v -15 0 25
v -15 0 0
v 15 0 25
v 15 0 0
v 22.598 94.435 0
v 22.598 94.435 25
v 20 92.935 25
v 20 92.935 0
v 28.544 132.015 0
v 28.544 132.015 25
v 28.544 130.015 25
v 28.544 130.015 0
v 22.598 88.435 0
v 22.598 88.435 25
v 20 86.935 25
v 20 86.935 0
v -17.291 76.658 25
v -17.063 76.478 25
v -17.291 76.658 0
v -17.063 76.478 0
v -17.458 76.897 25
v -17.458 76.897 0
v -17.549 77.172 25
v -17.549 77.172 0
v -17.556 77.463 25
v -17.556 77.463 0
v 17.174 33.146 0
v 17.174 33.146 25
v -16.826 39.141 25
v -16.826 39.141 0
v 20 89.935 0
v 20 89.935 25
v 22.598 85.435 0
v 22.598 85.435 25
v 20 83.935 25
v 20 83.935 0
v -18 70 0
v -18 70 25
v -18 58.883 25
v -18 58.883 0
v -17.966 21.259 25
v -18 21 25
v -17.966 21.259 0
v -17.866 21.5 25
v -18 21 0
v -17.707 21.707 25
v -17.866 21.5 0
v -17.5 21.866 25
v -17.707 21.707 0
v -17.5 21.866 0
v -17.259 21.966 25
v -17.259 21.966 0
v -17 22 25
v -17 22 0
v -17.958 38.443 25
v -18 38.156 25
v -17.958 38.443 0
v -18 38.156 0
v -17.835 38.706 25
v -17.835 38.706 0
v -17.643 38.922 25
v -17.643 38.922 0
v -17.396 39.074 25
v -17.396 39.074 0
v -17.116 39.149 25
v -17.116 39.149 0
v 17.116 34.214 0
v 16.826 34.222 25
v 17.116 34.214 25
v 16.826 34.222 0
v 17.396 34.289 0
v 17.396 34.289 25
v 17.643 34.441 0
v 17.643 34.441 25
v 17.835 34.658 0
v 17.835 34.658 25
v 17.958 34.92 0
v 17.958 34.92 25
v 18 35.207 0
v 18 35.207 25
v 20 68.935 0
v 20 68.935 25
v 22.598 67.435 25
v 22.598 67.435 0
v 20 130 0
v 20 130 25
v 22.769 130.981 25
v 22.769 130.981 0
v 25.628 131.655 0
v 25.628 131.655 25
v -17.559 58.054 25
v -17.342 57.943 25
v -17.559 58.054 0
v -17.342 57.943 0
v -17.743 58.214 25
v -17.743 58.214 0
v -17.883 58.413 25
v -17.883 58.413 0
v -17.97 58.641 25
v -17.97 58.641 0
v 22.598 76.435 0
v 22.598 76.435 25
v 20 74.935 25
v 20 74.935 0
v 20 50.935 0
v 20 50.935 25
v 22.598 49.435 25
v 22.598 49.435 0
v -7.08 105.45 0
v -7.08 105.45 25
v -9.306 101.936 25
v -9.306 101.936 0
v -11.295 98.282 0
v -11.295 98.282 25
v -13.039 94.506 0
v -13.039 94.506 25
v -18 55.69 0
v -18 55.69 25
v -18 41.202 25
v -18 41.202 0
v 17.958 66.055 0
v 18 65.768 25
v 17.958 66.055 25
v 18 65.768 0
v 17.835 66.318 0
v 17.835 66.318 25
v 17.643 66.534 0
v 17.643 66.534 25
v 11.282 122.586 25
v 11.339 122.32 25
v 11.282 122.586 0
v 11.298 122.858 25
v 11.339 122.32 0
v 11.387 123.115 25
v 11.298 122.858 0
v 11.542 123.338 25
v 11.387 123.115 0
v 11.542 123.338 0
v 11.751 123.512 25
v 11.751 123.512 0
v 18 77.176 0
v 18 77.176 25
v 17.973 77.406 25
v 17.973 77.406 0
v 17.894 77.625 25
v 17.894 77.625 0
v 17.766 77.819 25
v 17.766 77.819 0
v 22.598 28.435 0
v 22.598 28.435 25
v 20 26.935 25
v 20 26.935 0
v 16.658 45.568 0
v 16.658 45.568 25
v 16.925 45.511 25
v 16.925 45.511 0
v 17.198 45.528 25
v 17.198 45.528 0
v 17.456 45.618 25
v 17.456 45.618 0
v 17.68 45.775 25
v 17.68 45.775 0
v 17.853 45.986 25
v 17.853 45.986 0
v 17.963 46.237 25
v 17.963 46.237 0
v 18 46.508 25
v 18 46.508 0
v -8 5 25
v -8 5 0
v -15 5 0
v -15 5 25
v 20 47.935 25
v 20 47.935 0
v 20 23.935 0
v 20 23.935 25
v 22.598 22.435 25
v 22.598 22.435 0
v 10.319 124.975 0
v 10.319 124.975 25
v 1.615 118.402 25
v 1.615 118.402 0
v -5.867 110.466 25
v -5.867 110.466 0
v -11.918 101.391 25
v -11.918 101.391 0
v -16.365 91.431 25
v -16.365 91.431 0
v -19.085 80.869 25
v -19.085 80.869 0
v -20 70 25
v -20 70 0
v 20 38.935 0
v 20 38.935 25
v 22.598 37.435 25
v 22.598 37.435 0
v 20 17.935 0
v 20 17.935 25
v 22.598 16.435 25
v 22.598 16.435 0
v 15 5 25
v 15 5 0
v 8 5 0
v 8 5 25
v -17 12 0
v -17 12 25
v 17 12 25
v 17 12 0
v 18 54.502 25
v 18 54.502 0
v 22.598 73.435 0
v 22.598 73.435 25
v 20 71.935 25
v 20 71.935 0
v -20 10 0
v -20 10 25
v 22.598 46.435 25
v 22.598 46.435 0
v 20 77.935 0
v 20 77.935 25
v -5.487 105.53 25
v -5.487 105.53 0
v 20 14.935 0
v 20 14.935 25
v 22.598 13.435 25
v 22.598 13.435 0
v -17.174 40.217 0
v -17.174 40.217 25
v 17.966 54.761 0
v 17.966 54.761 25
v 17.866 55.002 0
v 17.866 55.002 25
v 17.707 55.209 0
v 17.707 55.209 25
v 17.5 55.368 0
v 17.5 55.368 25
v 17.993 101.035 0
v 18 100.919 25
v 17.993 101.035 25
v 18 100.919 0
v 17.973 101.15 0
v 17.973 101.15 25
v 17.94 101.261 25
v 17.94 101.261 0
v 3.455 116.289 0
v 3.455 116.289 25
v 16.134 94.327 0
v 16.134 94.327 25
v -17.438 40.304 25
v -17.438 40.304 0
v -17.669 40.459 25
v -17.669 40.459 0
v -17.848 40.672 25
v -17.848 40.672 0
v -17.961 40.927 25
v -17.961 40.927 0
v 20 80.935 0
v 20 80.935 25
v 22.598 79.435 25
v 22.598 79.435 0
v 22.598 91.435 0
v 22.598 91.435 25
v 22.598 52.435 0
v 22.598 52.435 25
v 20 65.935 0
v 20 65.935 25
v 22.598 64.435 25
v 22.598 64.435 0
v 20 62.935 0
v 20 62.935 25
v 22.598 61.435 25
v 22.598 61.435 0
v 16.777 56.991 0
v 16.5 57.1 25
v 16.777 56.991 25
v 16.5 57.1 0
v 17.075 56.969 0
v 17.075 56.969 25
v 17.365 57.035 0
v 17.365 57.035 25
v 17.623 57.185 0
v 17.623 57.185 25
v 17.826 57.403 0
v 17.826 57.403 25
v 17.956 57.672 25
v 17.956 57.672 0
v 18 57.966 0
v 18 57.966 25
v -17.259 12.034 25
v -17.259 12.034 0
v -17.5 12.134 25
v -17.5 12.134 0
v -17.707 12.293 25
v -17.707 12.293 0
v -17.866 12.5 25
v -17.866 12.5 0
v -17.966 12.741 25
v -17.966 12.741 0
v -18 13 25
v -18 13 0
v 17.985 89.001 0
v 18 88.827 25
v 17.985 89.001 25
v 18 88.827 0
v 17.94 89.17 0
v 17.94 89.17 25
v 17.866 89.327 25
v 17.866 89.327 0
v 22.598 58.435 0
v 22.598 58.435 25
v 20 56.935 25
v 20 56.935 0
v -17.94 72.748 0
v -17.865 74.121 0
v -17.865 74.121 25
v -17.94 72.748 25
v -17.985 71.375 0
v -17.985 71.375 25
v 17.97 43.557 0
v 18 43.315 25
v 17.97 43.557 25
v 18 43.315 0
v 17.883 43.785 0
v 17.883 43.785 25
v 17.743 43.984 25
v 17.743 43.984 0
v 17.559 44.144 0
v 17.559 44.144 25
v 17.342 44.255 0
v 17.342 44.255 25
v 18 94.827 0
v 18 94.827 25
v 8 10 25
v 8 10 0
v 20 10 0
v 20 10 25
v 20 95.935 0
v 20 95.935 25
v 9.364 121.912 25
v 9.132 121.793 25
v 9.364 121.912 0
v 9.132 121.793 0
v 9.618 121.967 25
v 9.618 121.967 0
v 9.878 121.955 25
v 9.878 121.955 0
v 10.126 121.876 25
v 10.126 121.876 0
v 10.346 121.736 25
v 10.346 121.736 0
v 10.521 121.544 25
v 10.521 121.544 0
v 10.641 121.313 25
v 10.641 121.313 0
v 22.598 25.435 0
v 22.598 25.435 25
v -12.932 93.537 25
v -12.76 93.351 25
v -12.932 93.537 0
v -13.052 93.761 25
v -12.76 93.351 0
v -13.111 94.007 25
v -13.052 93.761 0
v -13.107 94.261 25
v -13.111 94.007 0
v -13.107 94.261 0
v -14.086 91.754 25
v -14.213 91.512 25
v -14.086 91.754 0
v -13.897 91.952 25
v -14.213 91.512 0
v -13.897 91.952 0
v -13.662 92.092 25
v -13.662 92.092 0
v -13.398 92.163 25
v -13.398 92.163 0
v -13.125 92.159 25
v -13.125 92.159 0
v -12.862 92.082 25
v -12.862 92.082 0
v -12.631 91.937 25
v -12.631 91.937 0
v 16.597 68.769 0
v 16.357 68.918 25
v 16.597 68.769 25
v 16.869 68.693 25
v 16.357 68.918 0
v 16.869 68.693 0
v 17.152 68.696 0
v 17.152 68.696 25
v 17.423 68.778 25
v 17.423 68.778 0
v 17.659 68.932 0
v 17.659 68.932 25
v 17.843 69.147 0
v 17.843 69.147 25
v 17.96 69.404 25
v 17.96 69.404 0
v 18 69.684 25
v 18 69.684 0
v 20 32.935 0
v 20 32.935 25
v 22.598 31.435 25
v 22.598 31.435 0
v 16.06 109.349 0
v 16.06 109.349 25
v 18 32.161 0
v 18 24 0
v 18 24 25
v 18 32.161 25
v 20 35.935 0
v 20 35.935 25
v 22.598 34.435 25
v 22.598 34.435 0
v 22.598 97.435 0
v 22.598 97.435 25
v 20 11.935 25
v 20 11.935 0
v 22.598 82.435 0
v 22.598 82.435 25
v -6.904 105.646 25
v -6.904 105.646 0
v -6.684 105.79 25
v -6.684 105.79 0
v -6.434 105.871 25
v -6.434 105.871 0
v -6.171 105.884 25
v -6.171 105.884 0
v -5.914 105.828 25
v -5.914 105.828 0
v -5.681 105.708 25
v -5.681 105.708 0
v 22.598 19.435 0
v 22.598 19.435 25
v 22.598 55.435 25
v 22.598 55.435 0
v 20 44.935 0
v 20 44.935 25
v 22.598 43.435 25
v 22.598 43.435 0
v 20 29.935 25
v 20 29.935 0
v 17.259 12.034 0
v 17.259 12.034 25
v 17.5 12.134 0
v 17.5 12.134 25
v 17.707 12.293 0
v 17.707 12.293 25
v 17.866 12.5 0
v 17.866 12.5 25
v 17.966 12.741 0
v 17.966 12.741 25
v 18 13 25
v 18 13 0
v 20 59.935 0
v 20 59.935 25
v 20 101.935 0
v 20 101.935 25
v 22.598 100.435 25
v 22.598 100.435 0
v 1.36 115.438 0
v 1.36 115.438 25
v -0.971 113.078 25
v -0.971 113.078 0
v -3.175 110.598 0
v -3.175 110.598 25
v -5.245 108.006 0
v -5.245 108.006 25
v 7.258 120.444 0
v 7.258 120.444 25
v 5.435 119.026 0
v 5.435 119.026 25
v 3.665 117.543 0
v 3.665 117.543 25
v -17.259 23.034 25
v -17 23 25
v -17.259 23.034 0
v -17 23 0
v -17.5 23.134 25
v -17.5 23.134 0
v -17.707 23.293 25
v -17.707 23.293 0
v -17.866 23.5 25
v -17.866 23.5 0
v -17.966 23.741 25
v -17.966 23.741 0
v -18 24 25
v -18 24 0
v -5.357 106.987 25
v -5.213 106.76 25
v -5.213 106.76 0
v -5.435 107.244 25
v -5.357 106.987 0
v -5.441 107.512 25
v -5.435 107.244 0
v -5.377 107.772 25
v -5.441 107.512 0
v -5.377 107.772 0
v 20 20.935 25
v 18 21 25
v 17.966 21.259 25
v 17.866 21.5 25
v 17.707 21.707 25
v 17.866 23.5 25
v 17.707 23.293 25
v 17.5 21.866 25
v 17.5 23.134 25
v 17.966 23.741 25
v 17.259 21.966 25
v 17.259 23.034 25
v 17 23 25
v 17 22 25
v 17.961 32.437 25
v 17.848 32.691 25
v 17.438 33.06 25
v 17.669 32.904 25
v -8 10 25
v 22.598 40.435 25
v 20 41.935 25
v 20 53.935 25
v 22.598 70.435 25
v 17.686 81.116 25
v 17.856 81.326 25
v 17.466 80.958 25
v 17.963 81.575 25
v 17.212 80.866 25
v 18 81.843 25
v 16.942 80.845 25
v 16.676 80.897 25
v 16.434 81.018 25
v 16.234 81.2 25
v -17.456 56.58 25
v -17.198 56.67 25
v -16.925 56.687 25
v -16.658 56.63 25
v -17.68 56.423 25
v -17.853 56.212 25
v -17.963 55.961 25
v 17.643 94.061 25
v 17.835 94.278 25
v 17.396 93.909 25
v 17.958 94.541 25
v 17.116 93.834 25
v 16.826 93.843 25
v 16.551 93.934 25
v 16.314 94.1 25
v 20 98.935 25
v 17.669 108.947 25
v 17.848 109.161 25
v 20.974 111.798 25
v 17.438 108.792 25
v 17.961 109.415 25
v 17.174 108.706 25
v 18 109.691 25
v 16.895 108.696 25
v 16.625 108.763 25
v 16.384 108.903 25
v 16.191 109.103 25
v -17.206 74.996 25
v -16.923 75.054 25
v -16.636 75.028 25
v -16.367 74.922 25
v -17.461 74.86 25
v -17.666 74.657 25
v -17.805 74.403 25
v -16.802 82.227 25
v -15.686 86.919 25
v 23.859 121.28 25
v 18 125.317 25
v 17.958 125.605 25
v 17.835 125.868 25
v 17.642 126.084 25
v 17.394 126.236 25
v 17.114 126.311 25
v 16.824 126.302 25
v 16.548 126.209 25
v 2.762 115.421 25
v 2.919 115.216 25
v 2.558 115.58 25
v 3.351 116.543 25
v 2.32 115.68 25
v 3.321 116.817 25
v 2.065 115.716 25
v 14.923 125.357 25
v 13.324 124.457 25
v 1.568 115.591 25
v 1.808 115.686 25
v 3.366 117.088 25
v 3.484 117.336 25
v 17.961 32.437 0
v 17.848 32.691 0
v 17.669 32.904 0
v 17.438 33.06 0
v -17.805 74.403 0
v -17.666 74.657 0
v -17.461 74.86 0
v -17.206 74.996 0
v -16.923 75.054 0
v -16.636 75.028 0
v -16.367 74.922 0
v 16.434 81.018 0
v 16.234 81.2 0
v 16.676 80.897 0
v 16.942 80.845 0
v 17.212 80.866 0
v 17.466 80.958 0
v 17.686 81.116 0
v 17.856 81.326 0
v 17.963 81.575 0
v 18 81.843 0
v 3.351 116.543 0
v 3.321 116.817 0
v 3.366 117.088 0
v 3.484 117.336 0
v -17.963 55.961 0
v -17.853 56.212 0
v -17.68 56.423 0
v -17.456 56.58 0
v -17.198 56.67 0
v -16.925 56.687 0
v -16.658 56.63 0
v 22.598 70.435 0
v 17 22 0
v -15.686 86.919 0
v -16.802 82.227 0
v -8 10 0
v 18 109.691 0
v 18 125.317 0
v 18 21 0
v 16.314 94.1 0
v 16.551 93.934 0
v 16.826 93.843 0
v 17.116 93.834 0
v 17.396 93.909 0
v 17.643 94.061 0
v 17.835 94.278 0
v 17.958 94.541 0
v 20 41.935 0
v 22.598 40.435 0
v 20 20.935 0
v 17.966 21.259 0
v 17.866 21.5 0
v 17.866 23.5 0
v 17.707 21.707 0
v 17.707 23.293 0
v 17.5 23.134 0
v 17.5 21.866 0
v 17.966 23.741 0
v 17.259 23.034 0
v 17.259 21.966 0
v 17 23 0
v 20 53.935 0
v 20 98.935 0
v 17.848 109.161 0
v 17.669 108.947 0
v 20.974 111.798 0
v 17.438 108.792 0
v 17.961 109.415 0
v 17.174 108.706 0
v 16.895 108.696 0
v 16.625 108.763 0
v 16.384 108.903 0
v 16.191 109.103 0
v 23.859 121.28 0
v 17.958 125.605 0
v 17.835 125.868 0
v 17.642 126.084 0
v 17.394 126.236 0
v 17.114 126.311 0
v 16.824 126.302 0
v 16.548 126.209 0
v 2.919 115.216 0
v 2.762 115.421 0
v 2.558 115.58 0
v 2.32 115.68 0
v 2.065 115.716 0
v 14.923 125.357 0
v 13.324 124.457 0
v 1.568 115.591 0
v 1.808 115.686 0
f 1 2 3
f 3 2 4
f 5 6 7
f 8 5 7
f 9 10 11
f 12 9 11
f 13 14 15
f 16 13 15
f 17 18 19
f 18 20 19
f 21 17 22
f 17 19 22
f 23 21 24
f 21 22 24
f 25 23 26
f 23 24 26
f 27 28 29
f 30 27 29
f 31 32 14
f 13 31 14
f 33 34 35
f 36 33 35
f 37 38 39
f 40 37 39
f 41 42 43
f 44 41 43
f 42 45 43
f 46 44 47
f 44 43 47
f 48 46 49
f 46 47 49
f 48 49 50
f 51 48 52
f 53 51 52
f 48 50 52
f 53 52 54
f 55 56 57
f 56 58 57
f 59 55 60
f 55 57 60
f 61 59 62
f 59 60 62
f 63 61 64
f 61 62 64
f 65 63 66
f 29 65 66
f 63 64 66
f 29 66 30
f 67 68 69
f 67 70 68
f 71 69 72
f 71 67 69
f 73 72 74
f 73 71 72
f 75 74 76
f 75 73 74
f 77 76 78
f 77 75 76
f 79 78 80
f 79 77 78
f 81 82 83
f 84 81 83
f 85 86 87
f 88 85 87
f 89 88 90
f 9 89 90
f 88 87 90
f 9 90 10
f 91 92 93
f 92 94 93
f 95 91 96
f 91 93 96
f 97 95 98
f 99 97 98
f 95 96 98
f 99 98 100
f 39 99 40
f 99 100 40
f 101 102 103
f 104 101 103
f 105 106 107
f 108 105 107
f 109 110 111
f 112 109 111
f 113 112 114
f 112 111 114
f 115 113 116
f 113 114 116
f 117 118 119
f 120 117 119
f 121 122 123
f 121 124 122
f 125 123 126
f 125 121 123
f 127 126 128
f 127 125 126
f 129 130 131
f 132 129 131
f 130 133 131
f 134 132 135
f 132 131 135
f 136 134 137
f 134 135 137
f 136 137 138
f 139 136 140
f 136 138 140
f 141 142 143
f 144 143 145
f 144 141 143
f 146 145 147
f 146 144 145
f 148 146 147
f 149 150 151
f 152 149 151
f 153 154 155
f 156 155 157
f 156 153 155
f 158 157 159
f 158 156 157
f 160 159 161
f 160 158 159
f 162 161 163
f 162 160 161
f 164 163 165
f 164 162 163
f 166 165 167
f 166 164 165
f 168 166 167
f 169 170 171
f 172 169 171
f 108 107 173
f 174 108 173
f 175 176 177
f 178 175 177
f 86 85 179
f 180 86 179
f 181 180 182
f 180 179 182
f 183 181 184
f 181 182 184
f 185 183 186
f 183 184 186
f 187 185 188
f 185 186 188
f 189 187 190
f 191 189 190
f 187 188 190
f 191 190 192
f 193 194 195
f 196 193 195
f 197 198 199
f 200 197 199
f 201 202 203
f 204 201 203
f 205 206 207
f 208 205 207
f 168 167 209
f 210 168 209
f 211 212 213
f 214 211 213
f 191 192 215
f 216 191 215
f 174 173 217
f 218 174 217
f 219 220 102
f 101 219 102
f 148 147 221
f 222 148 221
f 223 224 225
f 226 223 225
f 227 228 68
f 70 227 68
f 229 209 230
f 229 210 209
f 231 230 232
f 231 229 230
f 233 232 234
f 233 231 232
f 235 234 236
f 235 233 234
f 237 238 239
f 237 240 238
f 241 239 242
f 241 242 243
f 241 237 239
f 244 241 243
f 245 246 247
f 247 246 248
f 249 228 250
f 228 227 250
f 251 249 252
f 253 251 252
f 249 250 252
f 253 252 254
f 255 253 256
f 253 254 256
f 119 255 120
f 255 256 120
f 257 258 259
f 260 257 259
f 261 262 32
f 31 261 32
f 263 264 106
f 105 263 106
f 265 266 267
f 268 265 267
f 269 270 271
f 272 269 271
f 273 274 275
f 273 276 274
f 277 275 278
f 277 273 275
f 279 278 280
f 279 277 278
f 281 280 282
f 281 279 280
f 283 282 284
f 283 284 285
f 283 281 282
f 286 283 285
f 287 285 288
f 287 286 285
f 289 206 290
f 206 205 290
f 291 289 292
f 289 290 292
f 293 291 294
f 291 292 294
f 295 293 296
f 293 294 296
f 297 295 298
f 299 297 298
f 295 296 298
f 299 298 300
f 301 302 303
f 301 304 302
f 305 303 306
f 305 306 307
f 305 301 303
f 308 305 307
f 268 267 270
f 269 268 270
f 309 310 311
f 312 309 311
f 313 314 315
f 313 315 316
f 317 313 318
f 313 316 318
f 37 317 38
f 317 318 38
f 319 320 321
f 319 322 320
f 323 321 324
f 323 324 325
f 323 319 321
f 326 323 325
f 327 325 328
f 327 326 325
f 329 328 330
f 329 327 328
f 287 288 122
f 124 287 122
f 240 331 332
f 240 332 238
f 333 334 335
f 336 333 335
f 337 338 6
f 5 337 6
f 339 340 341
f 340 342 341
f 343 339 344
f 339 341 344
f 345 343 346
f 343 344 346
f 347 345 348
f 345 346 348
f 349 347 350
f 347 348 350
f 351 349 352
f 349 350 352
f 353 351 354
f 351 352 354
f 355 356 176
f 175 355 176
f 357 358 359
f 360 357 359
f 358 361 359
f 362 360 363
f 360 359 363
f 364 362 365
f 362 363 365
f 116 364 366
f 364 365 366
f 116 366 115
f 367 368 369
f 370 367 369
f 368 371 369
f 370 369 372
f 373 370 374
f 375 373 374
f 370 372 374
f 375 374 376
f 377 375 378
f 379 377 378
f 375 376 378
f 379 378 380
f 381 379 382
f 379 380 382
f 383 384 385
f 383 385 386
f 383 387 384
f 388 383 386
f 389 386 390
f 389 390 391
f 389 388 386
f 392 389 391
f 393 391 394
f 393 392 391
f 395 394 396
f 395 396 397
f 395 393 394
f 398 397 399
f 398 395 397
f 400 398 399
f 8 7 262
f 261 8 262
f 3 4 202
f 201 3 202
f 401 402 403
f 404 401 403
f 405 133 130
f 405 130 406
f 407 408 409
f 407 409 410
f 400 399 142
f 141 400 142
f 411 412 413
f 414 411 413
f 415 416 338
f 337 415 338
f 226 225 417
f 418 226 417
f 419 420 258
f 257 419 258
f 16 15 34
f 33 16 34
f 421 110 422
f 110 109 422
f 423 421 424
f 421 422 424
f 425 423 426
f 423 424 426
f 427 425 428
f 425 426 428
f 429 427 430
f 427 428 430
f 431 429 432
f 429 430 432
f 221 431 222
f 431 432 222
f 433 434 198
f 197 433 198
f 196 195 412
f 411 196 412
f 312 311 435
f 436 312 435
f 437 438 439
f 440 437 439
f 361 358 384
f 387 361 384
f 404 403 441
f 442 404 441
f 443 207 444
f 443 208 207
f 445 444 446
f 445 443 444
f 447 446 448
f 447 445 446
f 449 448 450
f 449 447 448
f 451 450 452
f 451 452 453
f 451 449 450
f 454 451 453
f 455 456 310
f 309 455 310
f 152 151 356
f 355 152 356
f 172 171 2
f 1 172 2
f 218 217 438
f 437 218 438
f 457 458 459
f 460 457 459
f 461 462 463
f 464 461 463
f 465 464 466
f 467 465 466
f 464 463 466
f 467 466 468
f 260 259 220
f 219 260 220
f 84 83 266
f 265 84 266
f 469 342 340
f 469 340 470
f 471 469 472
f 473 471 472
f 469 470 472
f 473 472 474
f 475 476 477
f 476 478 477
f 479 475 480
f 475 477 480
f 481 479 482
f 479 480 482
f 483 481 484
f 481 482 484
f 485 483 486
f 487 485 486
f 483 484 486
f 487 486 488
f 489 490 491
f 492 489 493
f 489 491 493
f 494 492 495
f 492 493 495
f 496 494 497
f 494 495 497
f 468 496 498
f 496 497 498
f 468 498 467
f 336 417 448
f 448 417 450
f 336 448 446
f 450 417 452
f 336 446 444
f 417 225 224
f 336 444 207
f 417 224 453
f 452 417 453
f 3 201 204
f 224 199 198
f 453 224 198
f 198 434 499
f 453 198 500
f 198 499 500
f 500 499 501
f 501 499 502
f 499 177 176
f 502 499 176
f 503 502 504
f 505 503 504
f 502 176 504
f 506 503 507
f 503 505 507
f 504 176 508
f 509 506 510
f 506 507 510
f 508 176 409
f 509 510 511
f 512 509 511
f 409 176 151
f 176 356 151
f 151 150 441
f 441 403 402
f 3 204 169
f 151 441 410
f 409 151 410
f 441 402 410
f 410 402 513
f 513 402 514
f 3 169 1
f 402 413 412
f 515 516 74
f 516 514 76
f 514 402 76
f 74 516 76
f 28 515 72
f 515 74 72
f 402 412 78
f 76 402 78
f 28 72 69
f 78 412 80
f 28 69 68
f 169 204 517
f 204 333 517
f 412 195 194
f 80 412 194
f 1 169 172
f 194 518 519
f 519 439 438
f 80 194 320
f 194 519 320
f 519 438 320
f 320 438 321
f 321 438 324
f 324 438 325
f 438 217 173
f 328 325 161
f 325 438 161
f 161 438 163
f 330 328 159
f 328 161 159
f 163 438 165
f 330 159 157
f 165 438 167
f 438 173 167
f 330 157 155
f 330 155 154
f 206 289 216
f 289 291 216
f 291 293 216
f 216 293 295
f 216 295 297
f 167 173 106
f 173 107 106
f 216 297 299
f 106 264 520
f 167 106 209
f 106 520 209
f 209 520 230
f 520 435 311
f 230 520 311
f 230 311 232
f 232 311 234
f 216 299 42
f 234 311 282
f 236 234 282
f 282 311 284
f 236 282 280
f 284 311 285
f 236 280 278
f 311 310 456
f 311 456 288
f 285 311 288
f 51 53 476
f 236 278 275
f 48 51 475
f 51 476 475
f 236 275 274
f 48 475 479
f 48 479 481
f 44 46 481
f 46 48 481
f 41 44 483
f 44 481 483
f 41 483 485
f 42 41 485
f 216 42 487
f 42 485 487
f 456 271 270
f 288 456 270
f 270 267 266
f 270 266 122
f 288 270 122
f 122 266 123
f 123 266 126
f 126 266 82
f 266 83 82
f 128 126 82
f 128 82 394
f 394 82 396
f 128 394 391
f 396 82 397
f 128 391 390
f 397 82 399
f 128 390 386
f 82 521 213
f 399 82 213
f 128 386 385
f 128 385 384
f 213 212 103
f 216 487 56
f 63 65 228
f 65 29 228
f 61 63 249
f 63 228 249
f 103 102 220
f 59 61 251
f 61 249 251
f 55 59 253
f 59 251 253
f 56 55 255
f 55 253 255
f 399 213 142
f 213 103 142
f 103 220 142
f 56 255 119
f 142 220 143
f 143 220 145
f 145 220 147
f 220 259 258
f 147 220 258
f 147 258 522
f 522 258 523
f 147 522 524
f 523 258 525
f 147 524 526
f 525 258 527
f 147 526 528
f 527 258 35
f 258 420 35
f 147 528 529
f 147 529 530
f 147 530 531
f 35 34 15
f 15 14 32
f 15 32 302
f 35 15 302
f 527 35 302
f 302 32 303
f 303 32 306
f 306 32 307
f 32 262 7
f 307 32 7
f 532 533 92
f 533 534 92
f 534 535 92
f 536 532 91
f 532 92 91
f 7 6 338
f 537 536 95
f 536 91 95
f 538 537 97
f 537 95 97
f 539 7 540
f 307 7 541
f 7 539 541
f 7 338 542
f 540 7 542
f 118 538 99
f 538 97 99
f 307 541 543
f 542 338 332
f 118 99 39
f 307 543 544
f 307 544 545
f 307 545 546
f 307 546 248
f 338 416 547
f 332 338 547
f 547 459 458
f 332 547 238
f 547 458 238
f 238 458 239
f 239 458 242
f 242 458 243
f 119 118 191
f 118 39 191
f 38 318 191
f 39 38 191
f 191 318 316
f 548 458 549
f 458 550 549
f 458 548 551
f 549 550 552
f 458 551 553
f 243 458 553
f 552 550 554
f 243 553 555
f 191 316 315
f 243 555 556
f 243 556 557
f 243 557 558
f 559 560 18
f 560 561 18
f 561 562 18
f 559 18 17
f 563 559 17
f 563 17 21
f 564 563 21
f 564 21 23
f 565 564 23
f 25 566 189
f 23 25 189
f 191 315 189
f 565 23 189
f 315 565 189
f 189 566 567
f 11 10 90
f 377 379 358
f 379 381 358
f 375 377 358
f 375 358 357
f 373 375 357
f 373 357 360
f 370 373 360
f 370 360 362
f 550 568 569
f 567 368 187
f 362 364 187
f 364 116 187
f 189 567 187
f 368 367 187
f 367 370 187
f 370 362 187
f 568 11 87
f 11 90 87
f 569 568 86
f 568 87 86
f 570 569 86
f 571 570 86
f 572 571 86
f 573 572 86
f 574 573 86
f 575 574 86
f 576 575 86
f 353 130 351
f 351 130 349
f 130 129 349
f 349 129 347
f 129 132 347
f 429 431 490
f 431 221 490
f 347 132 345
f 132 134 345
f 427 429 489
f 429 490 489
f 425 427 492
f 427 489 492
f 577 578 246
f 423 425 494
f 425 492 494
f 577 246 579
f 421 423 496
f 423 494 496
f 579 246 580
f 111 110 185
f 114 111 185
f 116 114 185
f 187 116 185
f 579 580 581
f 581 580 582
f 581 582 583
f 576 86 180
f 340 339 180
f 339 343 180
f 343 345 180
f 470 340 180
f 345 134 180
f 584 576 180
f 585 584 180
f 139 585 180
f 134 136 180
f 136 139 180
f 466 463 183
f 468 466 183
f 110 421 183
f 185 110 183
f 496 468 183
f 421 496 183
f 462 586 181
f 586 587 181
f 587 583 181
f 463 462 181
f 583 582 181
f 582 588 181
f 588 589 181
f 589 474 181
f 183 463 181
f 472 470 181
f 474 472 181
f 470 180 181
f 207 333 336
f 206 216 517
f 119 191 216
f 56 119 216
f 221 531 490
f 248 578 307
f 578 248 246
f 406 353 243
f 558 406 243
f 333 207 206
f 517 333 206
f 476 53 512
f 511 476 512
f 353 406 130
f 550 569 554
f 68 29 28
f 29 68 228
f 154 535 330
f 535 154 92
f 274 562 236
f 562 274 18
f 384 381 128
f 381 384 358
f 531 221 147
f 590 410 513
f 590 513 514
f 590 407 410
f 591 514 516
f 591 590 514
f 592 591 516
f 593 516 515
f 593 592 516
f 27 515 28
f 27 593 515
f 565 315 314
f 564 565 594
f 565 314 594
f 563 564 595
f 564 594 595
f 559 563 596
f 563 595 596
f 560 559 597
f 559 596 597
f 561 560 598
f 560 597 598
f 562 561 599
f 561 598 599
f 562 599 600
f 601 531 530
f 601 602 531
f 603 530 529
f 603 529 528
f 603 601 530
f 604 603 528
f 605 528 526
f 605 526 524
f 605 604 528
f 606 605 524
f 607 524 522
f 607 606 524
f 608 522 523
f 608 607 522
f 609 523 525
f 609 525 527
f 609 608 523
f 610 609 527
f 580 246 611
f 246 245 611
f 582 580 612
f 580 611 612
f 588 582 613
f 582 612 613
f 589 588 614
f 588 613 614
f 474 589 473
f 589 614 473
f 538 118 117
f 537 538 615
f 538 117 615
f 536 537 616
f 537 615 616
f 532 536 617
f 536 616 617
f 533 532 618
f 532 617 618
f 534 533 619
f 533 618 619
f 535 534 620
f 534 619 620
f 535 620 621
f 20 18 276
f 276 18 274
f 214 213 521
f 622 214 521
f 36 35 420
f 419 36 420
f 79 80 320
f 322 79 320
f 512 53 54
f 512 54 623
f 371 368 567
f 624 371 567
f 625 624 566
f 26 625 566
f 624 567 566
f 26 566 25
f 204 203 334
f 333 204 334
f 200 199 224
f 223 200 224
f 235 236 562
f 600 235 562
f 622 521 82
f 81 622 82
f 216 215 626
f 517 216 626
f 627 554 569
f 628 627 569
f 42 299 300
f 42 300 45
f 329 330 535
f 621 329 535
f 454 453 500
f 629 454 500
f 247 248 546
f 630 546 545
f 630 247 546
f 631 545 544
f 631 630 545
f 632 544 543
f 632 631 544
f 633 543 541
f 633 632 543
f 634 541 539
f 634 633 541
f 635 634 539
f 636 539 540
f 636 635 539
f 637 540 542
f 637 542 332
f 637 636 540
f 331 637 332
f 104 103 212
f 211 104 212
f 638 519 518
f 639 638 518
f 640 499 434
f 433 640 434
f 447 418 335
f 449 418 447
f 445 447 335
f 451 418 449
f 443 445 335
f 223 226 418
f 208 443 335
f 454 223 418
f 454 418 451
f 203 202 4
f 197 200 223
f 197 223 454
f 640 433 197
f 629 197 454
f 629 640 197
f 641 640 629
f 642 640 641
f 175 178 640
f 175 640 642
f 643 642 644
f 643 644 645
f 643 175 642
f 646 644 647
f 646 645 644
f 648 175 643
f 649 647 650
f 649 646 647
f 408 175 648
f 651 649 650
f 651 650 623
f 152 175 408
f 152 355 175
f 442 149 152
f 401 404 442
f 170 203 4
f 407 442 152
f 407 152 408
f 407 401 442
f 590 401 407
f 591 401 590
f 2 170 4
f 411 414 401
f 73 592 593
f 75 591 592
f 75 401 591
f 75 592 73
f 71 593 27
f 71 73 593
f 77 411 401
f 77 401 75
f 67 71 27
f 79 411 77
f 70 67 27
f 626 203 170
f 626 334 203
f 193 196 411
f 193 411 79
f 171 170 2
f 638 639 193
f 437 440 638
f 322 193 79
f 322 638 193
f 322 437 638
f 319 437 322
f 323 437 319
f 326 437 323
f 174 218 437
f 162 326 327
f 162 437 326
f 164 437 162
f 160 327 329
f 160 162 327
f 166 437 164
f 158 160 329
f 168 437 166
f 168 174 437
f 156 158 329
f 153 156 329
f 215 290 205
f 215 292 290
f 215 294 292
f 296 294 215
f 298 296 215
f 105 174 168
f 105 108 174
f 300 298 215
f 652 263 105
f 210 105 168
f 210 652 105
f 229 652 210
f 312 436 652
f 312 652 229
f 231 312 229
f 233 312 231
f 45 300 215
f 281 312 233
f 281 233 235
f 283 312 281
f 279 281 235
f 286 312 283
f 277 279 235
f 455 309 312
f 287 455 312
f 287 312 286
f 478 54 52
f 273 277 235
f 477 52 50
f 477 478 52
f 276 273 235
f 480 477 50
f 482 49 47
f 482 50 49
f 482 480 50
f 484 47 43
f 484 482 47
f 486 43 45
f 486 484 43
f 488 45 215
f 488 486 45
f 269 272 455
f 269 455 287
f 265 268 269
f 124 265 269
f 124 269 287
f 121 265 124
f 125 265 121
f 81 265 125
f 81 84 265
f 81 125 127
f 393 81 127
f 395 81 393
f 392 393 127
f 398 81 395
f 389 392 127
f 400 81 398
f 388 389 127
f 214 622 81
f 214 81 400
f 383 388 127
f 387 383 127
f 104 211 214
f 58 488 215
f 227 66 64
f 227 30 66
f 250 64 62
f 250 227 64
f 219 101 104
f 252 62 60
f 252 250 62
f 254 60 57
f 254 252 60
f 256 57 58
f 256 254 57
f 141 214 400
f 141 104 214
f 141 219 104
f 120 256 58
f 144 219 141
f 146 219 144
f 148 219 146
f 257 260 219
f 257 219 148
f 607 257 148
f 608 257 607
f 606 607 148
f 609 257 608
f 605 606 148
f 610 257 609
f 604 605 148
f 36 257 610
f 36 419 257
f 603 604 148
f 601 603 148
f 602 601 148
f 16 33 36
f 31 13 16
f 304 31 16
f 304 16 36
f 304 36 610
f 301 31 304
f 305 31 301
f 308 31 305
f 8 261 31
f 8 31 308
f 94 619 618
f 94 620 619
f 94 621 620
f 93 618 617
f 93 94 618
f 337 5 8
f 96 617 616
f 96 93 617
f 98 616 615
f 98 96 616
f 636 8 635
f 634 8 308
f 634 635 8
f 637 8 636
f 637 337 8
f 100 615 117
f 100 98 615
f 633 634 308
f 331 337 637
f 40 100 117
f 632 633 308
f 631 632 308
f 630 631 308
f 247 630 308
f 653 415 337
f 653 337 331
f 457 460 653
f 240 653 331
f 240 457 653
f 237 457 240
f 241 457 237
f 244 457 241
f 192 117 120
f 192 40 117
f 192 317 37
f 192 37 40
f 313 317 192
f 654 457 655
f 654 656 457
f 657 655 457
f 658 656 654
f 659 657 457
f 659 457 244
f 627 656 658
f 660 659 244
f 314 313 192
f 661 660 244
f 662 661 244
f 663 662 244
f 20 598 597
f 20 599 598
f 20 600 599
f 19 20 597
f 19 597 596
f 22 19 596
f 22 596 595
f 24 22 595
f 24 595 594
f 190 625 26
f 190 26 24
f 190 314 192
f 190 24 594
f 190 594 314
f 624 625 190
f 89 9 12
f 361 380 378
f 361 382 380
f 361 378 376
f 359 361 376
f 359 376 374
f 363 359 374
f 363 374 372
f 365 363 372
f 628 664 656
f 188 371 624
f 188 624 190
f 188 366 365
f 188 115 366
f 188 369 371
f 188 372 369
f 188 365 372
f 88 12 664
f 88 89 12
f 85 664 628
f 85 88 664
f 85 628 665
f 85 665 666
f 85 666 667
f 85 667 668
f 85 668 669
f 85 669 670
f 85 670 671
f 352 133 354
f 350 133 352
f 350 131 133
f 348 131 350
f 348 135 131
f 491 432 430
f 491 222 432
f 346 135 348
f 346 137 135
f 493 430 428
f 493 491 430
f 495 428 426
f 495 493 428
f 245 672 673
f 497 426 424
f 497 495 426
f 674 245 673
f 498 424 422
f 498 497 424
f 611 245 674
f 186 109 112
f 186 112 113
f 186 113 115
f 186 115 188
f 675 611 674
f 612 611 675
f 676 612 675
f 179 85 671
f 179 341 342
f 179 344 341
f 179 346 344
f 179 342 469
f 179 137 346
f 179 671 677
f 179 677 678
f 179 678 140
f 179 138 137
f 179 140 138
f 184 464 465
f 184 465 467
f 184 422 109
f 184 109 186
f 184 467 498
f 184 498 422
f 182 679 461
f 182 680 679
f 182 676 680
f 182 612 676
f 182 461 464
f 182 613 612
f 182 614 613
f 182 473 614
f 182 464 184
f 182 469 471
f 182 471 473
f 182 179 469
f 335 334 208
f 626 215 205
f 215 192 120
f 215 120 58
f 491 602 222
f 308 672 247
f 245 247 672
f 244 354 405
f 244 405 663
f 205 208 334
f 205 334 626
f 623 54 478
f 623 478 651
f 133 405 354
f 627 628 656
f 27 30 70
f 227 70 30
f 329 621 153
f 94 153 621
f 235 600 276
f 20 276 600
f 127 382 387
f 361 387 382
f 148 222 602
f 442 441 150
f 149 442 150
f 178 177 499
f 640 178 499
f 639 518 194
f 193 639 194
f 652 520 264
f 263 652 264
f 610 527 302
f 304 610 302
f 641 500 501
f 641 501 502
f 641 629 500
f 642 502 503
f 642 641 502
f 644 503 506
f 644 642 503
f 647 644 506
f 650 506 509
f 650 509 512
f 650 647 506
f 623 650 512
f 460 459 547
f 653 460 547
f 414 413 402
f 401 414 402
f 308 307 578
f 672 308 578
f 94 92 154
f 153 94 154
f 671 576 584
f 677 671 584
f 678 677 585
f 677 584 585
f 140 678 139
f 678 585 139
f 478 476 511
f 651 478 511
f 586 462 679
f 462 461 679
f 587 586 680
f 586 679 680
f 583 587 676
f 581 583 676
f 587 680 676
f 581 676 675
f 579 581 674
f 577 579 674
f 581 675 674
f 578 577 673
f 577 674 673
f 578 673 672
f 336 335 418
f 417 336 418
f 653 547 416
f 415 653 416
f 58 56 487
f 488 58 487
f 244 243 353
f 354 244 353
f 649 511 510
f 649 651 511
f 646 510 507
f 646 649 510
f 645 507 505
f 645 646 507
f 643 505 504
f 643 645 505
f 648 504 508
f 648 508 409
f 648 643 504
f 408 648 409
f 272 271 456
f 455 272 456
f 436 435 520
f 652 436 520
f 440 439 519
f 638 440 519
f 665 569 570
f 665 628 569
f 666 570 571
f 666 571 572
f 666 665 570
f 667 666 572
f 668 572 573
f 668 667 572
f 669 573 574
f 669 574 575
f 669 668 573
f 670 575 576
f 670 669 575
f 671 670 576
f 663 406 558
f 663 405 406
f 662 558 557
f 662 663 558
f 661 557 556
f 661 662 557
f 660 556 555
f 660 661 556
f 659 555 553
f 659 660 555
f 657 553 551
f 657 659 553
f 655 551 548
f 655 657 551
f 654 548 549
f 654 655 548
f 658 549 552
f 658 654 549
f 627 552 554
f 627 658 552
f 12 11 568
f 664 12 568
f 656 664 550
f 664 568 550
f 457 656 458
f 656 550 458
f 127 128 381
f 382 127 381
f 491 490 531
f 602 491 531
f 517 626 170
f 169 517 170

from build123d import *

# Parameters (mm, degrees)
BOSS_EXTRUDE1_DEPTH = 25
SKETCH3_W           = 36
SKETCH3_H           = 10
CUT_EXTRUDE1_DEPTH  = 134.88427839
CUT_EXTRUDE2_DEPTH  = 134.88427839
CUT_EXTRUDE3_DEPTH  = 134.88427839
CUT_EXTRUDE4_DEPTH  = 134.88427839
CUT_EXTRUDE5_DEPTH  = 134.88427839
CUT_EXTRUDE6_DEPTH  = 134.88427839
CUT_EXTRUDE7_DEPTH  = 134.88427839
CUT_EXTRUDE8_DEPTH  = 134.88427839
CUT_EXTRUDE9_DEPTH  = 134.88427839
FILLET1_R           = 1
BOSS_EXTRUDE2_DEPTH = 25
BOSS_EXTRUDE3_DEPTH = 25
LPATTERN1_COUNT     = 30
LPATTERN1_PITCH     = 3


with BuildPart() as part:
    # Sketch2 → Boss-Extrude1 (new body)
    with BuildSketch(Plane.XY):
        with BuildLine():
            Line((-15, 0), (15, 0))
            Line((15, 0), (15, 5))
            Line((15, 5), (8, 5))
            Line((8, 5), (8, 10))
            Line((8, 10), (20, 10))
            Line((20, 10), (20, 130))
            ThreePointArc((20, 130), (-9.083269132, 106.055512755), (-20, 70))
            Line((-20, 70), (-20, 10))
            Line((-20, 10), (-8, 10))
            Line((-8, 10), (-8, 5))
            Line((-8, 5), (-15, 5))
            Line((-15, 5), (-15, 0))
        make_face()
    extrude(amount=BOSS_EXTRUDE1_DEPTH)

    # Sketch3 → Cut-Extrude1 (cut, through all)
    with BuildSketch(Plane.XY.offset(25)):
        with Locations((0, 17)):
            Rectangle(SKETCH3_W, SKETCH3_H)
    extrude(amount=-CUT_EXTRUDE1_DEPTH, mode=Mode.SUBTRACT)

    # Sketch4 → Cut-Extrude2 (cut, through all)
    with BuildSketch(Plane.XY.offset(25)):
        Polygon((-18, 23), (18, 23), (18, 33), (-18, 39.347771306), align=None)
    extrude(amount=-CUT_EXTRUDE2_DEPTH, mode=Mode.SUBTRACT)

    # Sketch5 → Cut-Extrude3 (cut, through all)
    with BuildSketch(Plane.XY.offset(25)):
        Polygon((-18, 40.363197917), (18, 34.015426612), (18, 44.015426612), (-18, 57.118355045), align=None)
    extrude(amount=-CUT_EXTRUDE3_DEPTH, mode=Mode.SUBTRACT)

    # Sketch6 → Cut-Extrude4 (cut, through all)
    with BuildSketch(Plane.XY.offset(25)):
        with BuildLine():
            Line((-18, 58.182532818), (18, 45.079604384))
            Line((18, 45.079604384), (18, 55.079604384))
            Line((18, 55.079604384), (-17.740313653, 75.714284093))
            ThreePointArc((-17.740313653, 75.714284093), (-17.935044928, 72.860090894), (-18, 70))
            Line((-18, 70), (-18, 58.182532818))
        make_face()
    extrude(amount=-CUT_EXTRUDE4_DEPTH, mode=Mode.SUBTRACT)

    # Sketch12 → Cut-Extrude5 (cut, through all)
    with BuildSketch(Plane.XY.offset(25)):
        with BuildLine():
            Line((-17.631285006, 76.806036913), (18, 56.234304923))
            Line((18, 56.234304923), (18, 66.234304923))
            Line((18, 66.234304923), (-13.712387619, 92.844157678))
            ThreePointArc((-13.712387619, 92.844157678), (-16.199485709, 84.954027852), (-17.631285006, 76.806036913))
        make_face()
    extrude(amount=-CUT_EXTRUDE5_DEPTH, mode=Mode.SUBTRACT)

    # Sketch7 → Cut-Extrude6 (cut, through all)
    with BuildSketch(Plane.XY.offset(25)):
        with BuildLine():
            Line((-13.322364363, 93.822296597), (18, 67.539712212))
            Line((18, 67.539712212), (18, 77.539712212))
            Line((18, 77.539712212), (-6.326939086, 106.531429264))
            ThreePointArc((-6.326939086, 106.531429264), (-10.191692762, 100.378891521), (-13.322364363, 93.822296597))
        make_face()
    extrude(amount=-CUT_EXTRUDE6_DEPTH, mode=Mode.SUBTRACT)

    # Sketch8 → Cut-Extrude7 (cut, through all)
    with BuildSketch(Plane.XY.offset(25)):
        with BuildLine():
            Line((-5.722234691, 107.366494456), (18, 79.095436039))
            Line((18, 79.095436039), (18, 89.095436039))
            Line((18, 89.095436039), (2.287500379, 116.310283697))
            ThreePointArc((2.287500379, 116.310283697), (-1.93090917, 112.029629602), (-5.722234691, 107.366494456))
        make_face()
    extrude(amount=-CUT_EXTRUDE7_DEPTH, mode=Mode.SUBTRACT)

    # Sketch9 → Cut-Extrude8 (cut, through all)
    with BuildSketch(Plane.XY.offset(25)):
        with BuildLine():
            Line((3.04523541, 116.997848123), (18, 91.095436039))
            Line((18, 91.095436039), (18, 101.095436039))
            Line((18, 101.095436039), (10.202779023, 122.518124607))
            ThreePointArc((10.202779023, 122.518124607), (6.524875761, 119.886519369), (3.04523541, 116.997848123))
        make_face()
    extrude(amount=-CUT_EXTRUDE8_DEPTH, mode=Mode.SUBTRACT)

    # Sketch10 → Cut-Extrude9 (cut, through all)
    with BuildSketch(Plane.XY.offset(25)):
        with BuildLine():
            Line((11.063128519, 123.078138194), (18, 104.019240439))
            Line((18, 104.019240439), (18, 126.920997883))
            ThreePointArc((18, 126.920997883), (14.471038847, 125.108824438), (11.063128519, 123.078138194))
        make_face()
    extrude(amount=-CUT_EXTRUDE9_DEPTH, mode=Mode.SUBTRACT)

    # Fillet1
    fillet1_edges = [part.edges().sort_by_distance(p)[0] for p in [
        (-17.631285006, 76.806036913, 12.5),
        (-13.712387619, 92.844157678, 12.5),
        (18, 66.234304923, 12.5),
        (18, 56.234304923, 12.5),
        (-13.322364363, 93.822296597, 12.5),
        (-6.326939086, 106.531429264, 12.5),
        (18, 77.539712212, 12.5),
        (18, 67.539712212, 12.5),
        (-5.722234691, 107.366494456, 12.5),
        (2.287500379, 116.310283697, 12.5),
        (18, 89.095436039, 12.5),
        (18, 79.095436039, 12.5),
        (3.04523541, 116.997848123, 12.5),
        (10.202779023, 122.518124607, 12.5),
        (18, 101.095436039, 12.5),
        (18, 91.095436039, 12.5),
        (11.063128519, 123.078138194, 12.5),
        (18, 126.920997883, 12.5),
        (18, 104.019240439, 12.5),
        (-18, 12, 12.5),
        (-18, 22, 12.5),
        (18, 22, 12.5),
        (18, 12, 12.5),
        (-18, 23, 12.5),
        (-18, 39.347771306, 12.5),
        (18, 33, 12.5),
        (18, 23, 12.5),
        (-18, 40.363197917, 12.5),
        (-18, 57.118355045, 12.5),
        (18, 44.015426612, 12.5),
        (18, 34.015426612, 12.5),
        (-18, 58.182532818, 12.5),
        (-17.740313653, 75.714284093, 12.5),
        (18, 55.079604384, 12.5),
        (18, 45.079604384, 12.5),
    ]]
    fillet(fillet1_edges, radius=FILLET1_R)

    # Sketch13 → Boss-Extrude2 (add)
    with BuildSketch(Plane.XY.offset(25)):
        with BuildLine():
            Line((28.543587015, 132.015112463), (28.543587015, 130.015112463))
            ThreePointArc((28.543587015, 130.015112463), (22.183163486, 116.610368534), (20, 101.934676234))
            Line((20, 101.934676234), (20, 130))
            ThreePointArc((20, 130), (24.189413282, 131.356828362), (28.543587015, 132.015112463))
        make_face()
    extrude(amount=-BOSS_EXTRUDE2_DEPTH)

    # Sketch15 → Boss-Extrude3 (add)
    with BuildSketch(Plane.XY.offset(25)):
        Polygon((20, 101.934676234), (22.598076211, 100.434676234), (20, 98.934676234), align=None)
    boss_extrude3 = extrude(amount=-BOSS_EXTRUDE3_DEPTH)

    # LPattern1: Boss-Extrude3 ×30
    with Locations(*[(0, -i * LPATTERN1_PITCH, 0) for i in range(1, LPATTERN1_COUNT)]):
        add(boss_extrude3)


solid = part.part
